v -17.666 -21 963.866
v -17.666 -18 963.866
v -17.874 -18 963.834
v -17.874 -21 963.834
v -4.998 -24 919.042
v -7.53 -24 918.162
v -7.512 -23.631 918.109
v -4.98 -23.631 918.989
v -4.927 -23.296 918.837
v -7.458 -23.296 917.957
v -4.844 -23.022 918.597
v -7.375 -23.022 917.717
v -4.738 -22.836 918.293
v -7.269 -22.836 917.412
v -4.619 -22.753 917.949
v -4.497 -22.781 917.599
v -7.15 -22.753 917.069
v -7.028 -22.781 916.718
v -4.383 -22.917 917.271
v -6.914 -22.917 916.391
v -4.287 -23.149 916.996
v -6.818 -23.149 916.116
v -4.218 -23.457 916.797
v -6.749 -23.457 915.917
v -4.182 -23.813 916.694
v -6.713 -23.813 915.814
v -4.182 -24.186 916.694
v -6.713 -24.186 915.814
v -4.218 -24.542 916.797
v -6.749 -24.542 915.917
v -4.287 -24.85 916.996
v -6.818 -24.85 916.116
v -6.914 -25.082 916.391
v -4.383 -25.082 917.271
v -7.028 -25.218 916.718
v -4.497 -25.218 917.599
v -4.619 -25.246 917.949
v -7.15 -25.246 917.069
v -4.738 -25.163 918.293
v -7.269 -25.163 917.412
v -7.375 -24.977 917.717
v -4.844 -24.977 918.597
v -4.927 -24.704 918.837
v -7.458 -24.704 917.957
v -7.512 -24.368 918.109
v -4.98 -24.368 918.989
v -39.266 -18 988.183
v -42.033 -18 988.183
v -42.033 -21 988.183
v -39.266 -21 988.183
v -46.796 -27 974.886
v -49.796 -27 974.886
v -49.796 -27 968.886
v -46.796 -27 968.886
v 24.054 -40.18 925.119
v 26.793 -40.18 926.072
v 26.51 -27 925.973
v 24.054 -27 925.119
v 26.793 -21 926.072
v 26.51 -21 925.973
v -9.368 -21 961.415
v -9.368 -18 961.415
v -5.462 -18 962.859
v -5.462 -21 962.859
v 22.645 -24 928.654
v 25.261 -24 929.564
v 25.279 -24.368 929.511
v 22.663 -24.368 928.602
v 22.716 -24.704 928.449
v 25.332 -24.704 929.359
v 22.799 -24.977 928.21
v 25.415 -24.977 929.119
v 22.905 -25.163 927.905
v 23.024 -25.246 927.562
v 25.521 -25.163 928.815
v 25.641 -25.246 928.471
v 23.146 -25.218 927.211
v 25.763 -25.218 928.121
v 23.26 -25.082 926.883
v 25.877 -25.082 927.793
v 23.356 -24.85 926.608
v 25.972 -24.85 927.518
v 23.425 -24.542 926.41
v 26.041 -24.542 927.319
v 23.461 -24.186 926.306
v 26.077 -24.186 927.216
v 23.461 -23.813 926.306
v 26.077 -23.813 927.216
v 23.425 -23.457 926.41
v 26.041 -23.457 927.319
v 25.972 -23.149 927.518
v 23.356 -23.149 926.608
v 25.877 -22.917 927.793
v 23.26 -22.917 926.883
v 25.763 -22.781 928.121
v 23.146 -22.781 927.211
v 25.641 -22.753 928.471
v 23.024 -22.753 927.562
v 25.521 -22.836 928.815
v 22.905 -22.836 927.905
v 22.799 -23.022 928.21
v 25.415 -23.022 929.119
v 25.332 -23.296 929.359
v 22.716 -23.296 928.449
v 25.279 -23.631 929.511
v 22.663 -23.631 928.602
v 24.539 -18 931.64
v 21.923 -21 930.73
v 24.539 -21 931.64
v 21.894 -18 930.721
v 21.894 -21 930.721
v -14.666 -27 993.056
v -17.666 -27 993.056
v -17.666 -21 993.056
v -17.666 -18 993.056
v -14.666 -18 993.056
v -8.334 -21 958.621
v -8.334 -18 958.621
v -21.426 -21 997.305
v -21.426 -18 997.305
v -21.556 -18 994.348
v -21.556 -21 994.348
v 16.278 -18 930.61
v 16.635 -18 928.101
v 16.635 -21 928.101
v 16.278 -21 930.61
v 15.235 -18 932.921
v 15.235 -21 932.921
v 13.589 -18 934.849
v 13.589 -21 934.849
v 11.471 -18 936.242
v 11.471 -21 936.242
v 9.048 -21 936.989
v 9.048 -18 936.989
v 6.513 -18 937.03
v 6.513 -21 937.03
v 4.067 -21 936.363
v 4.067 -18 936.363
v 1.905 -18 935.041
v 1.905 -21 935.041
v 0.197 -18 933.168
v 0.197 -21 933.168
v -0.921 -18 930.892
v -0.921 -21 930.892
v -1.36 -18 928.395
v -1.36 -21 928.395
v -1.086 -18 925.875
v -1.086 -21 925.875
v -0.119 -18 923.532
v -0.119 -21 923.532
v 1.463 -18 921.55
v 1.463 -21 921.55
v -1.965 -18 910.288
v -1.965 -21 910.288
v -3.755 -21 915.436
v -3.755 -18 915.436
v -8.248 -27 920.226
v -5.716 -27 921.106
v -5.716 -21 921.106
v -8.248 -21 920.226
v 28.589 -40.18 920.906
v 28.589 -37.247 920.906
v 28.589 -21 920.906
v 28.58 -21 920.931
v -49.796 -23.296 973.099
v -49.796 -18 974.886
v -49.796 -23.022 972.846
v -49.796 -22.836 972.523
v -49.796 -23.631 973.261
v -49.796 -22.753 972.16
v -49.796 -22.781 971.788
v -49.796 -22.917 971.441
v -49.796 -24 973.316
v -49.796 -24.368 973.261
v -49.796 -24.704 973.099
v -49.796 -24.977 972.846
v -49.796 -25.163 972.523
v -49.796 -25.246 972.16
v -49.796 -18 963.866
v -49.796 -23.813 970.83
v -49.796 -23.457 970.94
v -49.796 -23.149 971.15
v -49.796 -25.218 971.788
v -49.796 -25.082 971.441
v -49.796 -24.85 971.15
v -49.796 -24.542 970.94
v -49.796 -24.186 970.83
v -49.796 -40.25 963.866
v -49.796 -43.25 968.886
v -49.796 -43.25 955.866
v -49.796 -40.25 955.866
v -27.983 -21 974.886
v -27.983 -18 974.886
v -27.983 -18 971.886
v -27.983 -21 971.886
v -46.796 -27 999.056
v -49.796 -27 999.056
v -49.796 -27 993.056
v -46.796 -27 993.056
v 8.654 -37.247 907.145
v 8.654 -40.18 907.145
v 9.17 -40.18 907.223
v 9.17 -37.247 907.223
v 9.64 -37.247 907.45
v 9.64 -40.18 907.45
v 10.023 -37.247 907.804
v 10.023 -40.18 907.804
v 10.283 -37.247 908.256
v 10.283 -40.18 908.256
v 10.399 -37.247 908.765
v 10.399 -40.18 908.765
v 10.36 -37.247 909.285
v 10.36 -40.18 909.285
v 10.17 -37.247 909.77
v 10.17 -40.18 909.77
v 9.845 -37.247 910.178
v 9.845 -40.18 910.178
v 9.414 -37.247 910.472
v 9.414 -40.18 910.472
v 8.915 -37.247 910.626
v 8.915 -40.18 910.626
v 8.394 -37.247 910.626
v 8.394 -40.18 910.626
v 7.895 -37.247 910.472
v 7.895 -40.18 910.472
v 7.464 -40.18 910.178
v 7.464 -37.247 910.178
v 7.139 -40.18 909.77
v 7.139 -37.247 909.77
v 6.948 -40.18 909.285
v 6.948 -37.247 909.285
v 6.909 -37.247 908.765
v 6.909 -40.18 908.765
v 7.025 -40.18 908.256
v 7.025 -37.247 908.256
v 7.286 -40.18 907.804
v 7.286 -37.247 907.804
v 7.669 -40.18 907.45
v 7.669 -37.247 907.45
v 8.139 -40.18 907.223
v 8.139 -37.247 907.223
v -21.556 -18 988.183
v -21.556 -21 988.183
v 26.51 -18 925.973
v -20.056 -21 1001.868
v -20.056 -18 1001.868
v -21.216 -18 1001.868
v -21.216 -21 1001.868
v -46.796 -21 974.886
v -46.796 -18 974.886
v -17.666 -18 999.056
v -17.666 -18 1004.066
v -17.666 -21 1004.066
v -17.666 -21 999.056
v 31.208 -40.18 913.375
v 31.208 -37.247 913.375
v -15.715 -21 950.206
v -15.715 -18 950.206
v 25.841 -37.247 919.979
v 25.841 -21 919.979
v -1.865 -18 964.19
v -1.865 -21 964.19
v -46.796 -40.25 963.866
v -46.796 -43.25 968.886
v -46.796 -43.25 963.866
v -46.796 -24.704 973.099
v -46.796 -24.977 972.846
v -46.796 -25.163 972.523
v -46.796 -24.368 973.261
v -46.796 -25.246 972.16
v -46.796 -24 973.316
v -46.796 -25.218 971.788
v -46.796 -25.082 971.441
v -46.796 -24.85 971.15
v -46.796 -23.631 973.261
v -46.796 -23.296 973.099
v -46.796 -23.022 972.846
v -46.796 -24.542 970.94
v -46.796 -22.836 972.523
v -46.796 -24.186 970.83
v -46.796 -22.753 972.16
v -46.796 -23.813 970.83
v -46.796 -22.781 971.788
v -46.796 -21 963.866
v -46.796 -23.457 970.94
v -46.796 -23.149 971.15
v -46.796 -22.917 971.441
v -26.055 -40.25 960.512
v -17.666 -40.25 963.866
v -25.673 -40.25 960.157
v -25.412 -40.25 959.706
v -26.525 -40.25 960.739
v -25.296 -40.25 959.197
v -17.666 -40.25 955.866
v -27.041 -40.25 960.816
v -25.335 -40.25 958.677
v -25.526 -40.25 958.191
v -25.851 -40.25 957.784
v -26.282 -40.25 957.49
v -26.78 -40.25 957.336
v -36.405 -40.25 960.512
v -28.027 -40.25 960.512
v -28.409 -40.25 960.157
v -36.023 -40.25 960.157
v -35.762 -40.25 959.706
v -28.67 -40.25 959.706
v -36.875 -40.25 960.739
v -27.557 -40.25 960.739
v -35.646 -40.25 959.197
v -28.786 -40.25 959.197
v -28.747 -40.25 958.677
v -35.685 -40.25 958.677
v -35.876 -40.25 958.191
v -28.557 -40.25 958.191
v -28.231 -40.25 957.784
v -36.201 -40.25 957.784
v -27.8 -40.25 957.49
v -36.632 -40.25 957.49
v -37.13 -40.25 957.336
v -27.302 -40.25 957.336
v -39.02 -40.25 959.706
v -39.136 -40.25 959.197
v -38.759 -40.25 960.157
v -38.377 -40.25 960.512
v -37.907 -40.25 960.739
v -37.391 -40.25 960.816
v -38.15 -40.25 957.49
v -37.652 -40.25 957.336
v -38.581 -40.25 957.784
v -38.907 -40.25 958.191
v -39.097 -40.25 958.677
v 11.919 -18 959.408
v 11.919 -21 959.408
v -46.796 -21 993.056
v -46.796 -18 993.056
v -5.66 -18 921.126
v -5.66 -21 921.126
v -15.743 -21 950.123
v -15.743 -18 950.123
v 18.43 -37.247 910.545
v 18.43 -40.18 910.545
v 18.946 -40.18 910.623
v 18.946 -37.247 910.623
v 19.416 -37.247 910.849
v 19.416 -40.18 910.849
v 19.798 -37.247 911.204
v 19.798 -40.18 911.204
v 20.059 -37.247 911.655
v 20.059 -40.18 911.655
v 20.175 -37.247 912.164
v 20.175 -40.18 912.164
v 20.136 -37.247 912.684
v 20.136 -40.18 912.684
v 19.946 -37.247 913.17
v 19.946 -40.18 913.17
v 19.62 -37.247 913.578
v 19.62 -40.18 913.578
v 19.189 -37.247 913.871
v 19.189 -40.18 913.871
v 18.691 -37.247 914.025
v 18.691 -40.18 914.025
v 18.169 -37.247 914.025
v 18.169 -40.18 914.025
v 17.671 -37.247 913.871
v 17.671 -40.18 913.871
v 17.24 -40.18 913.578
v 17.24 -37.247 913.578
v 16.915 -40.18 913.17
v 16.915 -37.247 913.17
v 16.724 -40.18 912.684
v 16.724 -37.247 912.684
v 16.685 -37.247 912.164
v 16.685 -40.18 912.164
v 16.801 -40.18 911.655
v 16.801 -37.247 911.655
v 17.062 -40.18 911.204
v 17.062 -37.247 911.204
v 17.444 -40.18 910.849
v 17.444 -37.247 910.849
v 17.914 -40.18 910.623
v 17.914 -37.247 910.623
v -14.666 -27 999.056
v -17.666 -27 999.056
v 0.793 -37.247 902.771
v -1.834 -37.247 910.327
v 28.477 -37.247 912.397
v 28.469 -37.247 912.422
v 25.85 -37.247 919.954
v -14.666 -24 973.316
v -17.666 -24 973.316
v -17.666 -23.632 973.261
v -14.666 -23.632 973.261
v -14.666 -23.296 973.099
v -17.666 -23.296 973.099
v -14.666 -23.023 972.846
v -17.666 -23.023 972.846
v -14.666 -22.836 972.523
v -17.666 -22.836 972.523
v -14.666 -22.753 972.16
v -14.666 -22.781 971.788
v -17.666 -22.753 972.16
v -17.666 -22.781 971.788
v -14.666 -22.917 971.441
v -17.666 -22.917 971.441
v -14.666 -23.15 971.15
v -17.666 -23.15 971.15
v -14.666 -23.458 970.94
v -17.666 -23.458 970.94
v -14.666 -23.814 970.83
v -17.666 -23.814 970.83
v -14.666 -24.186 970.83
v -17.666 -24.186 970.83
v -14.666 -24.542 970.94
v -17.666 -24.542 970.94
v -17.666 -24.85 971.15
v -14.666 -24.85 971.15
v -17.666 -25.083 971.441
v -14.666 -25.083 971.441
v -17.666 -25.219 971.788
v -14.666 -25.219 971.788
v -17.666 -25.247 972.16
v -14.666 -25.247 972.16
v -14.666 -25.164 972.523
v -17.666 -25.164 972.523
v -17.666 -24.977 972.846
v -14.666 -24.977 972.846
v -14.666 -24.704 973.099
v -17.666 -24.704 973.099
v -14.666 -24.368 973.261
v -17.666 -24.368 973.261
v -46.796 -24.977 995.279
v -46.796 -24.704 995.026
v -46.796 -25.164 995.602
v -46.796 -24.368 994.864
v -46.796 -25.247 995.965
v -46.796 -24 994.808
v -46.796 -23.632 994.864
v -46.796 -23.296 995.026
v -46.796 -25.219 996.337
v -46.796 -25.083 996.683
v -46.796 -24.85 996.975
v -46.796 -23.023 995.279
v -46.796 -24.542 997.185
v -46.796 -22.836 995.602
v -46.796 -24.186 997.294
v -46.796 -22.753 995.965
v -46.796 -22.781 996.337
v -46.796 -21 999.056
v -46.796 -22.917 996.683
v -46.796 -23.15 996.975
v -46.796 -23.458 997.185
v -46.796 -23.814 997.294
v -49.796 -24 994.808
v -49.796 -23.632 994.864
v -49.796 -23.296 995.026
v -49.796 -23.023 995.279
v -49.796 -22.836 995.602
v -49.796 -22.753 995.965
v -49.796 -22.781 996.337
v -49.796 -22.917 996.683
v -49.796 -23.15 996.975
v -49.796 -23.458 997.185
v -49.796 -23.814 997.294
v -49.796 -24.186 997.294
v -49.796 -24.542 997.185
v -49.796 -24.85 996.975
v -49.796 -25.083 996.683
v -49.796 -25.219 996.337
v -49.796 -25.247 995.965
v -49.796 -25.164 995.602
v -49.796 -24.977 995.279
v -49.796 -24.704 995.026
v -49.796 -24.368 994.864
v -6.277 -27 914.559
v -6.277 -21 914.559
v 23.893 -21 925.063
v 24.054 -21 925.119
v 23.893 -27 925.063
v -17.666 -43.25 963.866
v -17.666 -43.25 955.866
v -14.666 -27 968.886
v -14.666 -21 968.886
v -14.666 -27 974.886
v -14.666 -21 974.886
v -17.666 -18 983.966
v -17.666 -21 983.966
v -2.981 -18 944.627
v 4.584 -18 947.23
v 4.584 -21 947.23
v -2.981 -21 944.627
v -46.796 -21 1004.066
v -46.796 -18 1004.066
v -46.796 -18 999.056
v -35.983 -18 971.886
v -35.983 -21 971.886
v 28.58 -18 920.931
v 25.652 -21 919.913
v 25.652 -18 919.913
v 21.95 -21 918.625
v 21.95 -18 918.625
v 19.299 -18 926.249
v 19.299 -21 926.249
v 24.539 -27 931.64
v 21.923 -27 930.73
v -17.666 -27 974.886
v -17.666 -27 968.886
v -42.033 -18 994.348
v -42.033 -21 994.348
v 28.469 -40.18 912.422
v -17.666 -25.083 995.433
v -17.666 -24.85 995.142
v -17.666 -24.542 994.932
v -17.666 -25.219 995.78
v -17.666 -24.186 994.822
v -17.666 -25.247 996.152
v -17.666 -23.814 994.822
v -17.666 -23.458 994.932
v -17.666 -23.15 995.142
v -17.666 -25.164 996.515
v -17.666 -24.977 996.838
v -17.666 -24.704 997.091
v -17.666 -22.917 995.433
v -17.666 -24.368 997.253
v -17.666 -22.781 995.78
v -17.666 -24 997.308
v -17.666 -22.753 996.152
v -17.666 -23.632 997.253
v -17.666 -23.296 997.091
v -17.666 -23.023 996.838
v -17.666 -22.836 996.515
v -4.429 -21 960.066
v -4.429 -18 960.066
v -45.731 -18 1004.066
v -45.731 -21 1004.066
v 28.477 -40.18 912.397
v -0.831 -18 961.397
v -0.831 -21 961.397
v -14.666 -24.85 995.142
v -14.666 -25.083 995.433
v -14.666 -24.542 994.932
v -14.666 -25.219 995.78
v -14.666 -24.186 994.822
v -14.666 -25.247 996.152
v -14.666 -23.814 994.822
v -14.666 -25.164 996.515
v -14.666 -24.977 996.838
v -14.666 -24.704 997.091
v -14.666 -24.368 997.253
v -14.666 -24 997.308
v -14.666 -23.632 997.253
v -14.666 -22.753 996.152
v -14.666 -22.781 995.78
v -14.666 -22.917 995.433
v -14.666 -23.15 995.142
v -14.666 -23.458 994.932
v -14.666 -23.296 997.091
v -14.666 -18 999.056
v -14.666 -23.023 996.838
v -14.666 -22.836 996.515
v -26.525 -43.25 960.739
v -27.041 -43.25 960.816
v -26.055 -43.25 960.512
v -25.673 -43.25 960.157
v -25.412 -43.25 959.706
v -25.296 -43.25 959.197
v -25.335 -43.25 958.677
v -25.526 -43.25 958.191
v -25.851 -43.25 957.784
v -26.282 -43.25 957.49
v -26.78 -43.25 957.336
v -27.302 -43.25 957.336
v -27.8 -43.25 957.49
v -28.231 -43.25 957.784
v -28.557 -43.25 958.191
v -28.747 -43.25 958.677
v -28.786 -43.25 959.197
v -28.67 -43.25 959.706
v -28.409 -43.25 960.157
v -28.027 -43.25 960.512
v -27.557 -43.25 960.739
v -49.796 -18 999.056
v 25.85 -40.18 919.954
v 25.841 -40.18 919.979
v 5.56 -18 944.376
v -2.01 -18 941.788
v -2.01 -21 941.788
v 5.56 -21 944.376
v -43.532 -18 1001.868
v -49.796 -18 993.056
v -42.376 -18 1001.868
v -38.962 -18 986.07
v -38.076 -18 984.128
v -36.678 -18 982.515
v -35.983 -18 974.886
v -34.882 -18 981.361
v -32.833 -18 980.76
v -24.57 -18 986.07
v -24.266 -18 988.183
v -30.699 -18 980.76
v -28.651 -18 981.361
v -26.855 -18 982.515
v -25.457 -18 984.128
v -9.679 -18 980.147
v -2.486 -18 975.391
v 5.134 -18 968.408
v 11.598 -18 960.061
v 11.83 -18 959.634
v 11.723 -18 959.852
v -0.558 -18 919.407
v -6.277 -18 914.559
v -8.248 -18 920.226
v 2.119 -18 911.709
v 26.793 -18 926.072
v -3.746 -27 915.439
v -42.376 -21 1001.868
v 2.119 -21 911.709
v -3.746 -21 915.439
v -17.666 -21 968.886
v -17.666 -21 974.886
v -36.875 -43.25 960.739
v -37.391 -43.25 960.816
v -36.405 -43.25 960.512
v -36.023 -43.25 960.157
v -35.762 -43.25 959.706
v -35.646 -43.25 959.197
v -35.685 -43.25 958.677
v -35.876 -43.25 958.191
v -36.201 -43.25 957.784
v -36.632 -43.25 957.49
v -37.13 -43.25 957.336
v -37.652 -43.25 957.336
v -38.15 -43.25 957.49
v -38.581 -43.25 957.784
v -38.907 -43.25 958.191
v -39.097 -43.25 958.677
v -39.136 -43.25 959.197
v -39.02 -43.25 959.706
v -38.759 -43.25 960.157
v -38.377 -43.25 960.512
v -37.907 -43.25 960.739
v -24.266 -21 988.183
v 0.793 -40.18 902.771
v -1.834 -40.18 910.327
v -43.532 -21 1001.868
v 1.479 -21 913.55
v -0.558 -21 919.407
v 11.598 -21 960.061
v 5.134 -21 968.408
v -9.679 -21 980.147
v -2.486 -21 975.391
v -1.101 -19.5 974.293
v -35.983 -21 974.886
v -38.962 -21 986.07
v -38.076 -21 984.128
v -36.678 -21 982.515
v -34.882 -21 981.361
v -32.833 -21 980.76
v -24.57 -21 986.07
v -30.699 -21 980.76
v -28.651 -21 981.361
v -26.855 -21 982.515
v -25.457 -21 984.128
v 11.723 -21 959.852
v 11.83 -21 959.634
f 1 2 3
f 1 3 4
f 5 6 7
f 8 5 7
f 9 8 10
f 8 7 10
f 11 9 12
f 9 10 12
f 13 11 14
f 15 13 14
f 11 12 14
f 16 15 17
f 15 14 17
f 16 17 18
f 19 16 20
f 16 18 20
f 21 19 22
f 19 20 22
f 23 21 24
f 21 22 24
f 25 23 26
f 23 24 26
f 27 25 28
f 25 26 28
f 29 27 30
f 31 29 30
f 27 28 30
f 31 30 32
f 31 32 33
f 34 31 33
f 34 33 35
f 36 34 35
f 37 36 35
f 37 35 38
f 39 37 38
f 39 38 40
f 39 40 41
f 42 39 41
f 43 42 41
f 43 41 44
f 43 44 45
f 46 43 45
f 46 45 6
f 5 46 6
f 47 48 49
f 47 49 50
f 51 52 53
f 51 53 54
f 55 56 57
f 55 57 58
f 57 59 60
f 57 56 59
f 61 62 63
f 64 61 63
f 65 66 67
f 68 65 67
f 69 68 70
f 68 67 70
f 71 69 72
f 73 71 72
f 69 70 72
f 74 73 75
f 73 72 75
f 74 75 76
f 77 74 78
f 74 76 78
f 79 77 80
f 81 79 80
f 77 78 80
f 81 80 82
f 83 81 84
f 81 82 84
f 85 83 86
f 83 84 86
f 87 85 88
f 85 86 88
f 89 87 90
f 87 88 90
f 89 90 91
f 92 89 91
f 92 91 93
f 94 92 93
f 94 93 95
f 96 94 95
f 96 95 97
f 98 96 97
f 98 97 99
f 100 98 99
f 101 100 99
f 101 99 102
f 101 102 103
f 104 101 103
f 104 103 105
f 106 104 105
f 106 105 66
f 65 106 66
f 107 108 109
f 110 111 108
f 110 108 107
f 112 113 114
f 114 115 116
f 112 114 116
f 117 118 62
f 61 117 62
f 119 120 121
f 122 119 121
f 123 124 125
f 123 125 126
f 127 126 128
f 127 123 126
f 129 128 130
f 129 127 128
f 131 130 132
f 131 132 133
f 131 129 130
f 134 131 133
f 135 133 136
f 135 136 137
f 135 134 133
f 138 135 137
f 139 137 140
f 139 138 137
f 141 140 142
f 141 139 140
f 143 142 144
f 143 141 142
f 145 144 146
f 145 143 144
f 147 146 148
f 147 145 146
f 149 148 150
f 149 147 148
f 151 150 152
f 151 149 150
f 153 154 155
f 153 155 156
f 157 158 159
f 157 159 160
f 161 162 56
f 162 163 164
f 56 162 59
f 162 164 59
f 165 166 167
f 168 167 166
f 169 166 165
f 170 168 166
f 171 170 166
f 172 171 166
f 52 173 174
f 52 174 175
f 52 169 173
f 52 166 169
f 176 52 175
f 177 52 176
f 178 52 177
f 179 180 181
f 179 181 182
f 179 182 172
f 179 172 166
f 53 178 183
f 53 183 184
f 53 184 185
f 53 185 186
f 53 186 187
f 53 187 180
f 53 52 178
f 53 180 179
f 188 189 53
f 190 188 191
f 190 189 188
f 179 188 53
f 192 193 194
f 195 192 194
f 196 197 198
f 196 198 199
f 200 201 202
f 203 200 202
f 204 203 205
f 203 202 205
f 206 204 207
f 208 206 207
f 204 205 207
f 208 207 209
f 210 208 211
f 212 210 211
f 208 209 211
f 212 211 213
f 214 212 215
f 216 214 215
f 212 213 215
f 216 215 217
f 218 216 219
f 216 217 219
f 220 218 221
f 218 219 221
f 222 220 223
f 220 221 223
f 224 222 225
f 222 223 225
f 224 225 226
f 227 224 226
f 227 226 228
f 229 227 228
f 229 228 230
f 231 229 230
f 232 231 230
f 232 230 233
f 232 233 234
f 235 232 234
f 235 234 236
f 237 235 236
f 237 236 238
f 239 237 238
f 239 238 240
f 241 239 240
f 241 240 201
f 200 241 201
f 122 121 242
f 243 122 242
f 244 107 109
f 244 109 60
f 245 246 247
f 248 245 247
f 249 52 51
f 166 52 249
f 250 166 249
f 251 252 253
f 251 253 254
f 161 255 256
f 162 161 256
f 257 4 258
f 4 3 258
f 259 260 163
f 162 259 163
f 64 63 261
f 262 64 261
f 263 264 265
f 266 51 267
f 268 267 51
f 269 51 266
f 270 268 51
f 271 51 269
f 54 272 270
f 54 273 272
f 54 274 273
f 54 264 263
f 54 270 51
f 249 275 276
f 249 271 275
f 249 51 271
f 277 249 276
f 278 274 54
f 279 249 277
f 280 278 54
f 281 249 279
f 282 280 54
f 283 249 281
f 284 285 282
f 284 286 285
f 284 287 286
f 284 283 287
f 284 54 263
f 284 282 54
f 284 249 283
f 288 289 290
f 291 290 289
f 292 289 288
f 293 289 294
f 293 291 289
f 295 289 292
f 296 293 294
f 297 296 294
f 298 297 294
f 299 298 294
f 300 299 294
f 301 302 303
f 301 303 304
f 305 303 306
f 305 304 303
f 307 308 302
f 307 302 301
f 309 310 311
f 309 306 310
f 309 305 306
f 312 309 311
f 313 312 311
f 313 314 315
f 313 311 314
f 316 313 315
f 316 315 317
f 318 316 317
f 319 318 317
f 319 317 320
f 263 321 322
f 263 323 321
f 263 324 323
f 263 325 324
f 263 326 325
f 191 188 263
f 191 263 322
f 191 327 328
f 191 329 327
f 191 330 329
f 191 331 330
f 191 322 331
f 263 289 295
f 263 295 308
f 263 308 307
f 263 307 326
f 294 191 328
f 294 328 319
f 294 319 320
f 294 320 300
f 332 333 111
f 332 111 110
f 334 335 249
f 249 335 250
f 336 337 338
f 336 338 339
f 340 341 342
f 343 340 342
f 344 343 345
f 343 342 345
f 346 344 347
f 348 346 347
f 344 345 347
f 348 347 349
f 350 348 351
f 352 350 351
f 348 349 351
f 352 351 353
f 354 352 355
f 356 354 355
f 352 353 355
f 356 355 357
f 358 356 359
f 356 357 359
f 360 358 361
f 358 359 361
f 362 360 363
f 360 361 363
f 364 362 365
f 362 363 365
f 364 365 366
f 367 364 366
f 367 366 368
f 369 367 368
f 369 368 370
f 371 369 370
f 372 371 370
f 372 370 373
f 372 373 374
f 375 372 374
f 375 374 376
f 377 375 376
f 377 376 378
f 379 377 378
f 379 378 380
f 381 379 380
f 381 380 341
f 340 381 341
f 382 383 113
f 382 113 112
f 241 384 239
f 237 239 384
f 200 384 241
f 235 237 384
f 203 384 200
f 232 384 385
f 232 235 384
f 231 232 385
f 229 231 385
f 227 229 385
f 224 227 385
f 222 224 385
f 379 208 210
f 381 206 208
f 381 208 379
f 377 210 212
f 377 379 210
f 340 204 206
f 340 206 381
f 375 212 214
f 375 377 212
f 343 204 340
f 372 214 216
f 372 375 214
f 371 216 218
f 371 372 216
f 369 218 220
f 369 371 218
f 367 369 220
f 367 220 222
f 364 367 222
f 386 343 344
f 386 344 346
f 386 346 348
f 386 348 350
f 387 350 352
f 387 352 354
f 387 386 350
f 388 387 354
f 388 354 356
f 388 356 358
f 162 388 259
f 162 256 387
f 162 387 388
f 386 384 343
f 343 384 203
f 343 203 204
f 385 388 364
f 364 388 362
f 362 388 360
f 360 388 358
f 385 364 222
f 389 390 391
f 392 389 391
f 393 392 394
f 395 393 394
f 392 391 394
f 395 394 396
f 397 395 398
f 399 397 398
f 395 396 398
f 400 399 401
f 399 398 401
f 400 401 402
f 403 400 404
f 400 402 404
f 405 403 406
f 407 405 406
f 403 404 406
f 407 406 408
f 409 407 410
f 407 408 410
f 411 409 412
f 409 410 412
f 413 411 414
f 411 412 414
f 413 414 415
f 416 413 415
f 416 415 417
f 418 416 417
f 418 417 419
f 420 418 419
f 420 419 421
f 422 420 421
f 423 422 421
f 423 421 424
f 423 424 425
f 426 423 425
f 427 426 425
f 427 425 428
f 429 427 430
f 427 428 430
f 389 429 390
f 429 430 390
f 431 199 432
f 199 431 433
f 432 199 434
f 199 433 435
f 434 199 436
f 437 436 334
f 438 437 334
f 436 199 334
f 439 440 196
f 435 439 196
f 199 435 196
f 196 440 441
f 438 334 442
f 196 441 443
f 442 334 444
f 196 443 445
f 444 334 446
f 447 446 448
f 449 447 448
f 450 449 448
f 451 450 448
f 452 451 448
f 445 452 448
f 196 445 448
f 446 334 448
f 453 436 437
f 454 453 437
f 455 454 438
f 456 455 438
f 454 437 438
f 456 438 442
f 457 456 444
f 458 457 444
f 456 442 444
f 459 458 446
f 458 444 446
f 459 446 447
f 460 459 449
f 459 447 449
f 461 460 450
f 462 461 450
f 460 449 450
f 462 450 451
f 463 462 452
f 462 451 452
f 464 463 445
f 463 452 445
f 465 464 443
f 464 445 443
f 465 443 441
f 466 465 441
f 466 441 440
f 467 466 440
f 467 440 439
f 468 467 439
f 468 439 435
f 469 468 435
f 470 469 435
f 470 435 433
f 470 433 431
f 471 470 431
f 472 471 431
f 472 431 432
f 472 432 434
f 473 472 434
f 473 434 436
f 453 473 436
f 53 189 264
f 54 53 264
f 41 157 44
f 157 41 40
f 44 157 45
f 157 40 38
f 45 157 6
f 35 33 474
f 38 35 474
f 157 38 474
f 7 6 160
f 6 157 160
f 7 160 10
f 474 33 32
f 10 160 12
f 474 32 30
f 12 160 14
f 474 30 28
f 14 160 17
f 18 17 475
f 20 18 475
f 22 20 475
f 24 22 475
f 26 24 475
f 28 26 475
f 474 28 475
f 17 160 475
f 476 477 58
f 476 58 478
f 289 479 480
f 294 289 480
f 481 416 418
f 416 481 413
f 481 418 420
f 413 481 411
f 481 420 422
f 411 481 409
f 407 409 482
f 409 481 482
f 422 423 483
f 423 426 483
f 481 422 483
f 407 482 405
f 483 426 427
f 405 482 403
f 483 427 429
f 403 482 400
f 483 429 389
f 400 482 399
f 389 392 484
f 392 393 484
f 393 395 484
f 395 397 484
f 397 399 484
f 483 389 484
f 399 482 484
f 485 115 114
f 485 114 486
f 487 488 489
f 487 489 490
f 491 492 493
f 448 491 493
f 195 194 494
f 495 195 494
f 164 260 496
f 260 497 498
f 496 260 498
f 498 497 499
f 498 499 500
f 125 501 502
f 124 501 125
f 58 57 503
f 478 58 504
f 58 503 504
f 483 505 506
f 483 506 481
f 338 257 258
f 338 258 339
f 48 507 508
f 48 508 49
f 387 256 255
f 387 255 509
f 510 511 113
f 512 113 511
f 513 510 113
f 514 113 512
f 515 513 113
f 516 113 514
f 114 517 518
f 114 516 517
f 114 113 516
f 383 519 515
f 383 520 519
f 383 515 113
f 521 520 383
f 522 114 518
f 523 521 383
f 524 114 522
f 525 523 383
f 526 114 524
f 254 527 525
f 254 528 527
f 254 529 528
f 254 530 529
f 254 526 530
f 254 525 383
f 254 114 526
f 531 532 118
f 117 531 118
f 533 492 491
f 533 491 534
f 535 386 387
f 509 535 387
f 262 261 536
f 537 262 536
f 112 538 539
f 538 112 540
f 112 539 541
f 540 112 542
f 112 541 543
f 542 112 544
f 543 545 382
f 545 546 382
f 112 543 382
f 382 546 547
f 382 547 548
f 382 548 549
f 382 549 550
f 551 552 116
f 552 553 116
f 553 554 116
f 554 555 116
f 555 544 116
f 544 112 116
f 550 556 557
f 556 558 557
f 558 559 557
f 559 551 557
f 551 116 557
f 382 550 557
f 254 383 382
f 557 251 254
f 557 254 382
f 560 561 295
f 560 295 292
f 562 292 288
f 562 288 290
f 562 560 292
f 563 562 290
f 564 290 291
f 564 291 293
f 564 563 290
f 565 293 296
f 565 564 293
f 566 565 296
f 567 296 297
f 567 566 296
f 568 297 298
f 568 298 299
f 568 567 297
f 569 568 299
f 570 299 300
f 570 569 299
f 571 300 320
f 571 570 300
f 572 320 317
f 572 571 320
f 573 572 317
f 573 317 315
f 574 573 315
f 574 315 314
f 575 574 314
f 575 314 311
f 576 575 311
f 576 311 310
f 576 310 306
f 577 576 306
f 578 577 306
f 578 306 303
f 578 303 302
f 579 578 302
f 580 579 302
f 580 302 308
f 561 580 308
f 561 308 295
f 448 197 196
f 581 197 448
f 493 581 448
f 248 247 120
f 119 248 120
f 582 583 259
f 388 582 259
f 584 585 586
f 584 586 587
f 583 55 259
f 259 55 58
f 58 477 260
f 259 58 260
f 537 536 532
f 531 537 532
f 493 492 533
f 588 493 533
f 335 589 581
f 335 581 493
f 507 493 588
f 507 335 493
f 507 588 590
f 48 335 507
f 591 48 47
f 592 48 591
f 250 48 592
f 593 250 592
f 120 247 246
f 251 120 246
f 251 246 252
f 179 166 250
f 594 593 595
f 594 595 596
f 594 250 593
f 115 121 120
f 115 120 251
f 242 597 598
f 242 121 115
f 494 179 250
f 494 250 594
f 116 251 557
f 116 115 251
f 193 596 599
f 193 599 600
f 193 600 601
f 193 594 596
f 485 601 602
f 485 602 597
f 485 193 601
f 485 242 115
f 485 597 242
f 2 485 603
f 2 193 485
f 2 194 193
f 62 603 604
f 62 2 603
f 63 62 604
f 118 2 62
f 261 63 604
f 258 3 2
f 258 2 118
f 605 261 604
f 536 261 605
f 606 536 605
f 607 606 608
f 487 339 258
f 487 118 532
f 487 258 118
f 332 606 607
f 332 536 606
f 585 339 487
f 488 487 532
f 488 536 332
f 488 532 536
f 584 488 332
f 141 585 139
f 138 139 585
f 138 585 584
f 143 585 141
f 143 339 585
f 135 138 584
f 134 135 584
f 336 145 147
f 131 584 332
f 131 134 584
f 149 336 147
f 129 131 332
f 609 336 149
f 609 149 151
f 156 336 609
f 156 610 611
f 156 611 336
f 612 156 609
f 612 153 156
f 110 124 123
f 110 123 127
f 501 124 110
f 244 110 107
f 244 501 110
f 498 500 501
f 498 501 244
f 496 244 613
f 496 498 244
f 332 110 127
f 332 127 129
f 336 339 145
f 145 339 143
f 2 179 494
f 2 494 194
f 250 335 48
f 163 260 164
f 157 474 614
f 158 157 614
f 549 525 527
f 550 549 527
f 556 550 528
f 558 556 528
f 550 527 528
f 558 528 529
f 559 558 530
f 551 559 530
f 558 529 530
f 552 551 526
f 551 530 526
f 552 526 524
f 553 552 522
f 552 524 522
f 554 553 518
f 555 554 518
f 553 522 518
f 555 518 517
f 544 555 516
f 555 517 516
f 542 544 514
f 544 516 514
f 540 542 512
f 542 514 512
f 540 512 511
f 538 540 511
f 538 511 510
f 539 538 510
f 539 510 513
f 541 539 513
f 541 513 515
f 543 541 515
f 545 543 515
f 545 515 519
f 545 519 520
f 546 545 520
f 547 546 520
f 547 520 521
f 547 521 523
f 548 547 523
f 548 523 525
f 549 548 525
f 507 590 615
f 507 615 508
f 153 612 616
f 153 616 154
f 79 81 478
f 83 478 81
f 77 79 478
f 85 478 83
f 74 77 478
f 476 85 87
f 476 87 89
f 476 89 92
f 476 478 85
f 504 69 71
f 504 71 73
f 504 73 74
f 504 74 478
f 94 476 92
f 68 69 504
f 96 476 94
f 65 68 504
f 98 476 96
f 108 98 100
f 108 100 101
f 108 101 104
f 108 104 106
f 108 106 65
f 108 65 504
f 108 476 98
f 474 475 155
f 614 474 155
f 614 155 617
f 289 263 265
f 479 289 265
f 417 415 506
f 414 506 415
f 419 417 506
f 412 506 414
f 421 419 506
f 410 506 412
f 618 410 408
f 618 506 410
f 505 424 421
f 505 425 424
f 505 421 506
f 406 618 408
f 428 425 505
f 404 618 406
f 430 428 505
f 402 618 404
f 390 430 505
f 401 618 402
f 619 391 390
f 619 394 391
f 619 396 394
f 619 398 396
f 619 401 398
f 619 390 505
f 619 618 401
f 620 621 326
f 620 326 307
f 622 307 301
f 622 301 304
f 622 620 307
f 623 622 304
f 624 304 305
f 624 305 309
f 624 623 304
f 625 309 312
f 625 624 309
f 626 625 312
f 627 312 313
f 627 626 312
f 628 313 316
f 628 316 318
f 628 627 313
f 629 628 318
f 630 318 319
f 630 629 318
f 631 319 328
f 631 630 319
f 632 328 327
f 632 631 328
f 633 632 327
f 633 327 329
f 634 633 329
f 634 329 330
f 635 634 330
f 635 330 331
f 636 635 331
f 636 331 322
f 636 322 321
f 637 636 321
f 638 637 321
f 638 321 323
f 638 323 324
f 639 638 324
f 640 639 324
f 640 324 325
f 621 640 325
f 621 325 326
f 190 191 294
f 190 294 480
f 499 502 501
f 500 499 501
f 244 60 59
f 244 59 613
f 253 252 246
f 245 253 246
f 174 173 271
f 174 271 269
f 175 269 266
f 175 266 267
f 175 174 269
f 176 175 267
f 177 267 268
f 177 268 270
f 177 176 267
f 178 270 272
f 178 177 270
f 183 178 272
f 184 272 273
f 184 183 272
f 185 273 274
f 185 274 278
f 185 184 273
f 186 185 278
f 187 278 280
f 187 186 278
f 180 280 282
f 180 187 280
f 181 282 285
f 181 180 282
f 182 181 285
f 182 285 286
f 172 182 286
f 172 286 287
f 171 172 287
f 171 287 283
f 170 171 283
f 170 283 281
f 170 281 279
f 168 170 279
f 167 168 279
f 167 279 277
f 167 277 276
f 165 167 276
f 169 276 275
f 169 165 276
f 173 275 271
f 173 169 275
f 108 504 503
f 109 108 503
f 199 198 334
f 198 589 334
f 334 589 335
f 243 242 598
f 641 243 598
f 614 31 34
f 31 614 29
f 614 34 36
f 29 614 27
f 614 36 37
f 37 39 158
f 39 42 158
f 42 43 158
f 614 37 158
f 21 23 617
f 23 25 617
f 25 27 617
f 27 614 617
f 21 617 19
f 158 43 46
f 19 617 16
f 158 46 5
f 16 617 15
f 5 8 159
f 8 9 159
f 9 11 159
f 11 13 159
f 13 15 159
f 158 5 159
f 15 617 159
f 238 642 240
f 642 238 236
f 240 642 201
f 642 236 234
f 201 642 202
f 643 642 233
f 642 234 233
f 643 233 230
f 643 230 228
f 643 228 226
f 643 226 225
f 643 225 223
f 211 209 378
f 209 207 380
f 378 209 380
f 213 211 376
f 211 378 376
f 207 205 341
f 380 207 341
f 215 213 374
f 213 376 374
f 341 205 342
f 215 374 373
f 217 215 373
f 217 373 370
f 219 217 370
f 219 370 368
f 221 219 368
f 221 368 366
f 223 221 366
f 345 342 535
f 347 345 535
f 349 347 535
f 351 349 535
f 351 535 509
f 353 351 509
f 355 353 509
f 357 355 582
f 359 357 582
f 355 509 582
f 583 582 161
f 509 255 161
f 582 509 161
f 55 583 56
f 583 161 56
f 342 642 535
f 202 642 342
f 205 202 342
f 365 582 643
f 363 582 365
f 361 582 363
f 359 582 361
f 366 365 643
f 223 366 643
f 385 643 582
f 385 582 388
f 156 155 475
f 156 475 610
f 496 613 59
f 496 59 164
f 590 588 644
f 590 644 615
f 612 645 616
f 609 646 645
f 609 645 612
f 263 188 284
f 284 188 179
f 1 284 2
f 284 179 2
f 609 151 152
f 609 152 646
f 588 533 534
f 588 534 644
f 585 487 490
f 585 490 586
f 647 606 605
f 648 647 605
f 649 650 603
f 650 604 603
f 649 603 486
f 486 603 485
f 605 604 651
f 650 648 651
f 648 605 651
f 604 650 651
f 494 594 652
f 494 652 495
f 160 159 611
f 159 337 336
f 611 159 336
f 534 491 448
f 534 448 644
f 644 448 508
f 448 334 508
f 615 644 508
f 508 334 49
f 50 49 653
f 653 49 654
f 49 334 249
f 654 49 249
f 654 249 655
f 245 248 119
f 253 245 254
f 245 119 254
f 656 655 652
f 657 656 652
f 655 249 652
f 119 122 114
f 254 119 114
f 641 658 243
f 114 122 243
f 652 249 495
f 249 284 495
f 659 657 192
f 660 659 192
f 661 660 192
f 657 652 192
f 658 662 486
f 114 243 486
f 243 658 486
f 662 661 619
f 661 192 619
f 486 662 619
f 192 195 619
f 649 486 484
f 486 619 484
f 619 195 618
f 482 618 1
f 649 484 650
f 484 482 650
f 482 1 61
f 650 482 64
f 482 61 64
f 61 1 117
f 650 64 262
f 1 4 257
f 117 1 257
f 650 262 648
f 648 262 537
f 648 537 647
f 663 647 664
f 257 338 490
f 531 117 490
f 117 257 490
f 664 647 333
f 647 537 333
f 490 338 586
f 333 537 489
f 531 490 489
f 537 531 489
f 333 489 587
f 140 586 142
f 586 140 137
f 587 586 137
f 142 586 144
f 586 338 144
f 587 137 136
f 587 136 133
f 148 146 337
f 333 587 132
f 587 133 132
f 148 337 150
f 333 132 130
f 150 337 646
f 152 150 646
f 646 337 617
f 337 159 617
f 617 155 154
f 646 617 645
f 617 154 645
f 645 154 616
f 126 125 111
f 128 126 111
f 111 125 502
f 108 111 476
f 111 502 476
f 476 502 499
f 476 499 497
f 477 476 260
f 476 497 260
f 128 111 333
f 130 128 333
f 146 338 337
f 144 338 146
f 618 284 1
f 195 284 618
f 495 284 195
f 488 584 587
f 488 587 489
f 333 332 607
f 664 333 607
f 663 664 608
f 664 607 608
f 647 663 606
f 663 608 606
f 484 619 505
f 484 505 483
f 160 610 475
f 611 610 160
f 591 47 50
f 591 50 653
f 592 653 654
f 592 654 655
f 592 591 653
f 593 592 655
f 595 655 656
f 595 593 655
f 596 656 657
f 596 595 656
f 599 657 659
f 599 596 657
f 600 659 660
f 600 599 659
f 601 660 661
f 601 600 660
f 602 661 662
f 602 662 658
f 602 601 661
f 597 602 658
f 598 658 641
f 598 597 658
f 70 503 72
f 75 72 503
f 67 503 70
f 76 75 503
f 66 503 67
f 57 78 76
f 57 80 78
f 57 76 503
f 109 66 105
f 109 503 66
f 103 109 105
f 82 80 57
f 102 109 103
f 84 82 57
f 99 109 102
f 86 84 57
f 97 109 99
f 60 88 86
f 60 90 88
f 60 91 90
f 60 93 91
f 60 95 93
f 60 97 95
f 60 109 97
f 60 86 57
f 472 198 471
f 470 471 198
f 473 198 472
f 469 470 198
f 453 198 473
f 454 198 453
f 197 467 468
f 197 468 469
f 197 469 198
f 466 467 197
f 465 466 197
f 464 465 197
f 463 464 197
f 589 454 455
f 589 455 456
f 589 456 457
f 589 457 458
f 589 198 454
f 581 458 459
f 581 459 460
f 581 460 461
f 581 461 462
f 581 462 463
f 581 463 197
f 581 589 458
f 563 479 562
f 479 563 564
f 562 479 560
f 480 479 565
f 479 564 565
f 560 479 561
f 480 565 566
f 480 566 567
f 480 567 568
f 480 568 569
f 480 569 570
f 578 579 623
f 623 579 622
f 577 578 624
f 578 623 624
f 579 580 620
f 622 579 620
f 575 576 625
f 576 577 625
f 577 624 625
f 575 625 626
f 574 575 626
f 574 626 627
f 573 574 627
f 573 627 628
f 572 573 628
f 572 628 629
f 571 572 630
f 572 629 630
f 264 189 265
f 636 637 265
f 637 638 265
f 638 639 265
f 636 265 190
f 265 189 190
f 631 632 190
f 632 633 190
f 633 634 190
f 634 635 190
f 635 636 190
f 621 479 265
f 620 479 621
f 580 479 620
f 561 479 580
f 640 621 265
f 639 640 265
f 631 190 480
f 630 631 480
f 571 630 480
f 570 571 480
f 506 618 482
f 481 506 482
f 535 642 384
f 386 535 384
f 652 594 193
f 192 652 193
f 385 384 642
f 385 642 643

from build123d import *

# Parameters (mm, degrees)
SKETCH1_W                 = 29.13
SKETCH1_H                 = 40.2
BOSS_EXTRUDE1_DEPTH       = 3
SKETCH3_W                 = 6
SKETCH3_H                 = 3
BOSS_EXTRUDE2_DEPTH       = 3
SKETCH4_W                 = 3
SKETCH4_H                 = 6
BOSS_EXTRUDE3_DEPTH       = 6
SKETCH6_W                 = 6
SKETCH6_H                 = 3
BOSS_EXTRUDE4_DEPTH       = 2
SKETCH7_W                 = 3.000000005
SKETCH7_H                 = 6
BOSS_EXTRUDE6_DEPTH       = 6
SKETCH9_R                 = 1.25
CUT_EXTRUDE1_DEPTH        = 3
SKETCH8_R                 = 1.250000001
CUT_EXTRUDE2_DEPTH        = 3
SKETCH11_W                = 6
SKETCH11_H                = 3
BOSS_EXTRUDE7_DEPTH       = 3
SKETCH19_W                = 3
SKETCH19_H                = 6
BOSS_EXTRUDE11_DEPTH      = 6
SKETCH21_W                = 6
SKETCH21_H                = 3
BOSS_EXTRUDE12_DEPTH      = 3
SKETCH22_W                = 3
SKETCH22_H                = 6
BOSS_EXTRUDE13_DEPTH      = 6
SKETCH24_R                = 1.25
CUT_EXTRUDE5_DEPTH        = 4
SKETCH23_R                = 1.25
CUT_EXTRUDE6_DEPTH        = 4
CUT_EXTRUDE11_DEPTH       = 4
SKETCH30_W                = 25.92
SKETCH30_H                = 3
CUT_EXTRUDE12_DEPTH       = 15
SKETCH33_W                = 29.17650364
SKETCH33_H                = 3
BOSS_EXTRUDE14_DEPTH      = 40.3
SKETCH34_W                = 21.00258235
SKETCH34_H                = 3
CUT_EXTRUDE15_DEPTH       = 25
SKETCH37_W                = 4.5
SKETCH37_H                = 3
SKETCH37_W_2              = 1.5
BOSS_EXTRUDE15_DEPTH      = 3
BOSS_EXTRUDE16_DEPTH      = 6
SKETCH41_W                = 6
SKETCH41_H                = 3
BOSS_EXTRUDE17_DEPTH      = 2.8
BOSS_EXTRUDE18_DEPTH      = 6
SKETCH46_W                = 5.02
SKETCH46_H                = 3
BOSS_EXTRUDE19_DEPTH      = 3
SKETCH48_W                = 3
SKETCH48_H                = 5.02
BOSS_EXTRUDE20_DEPTH      = 22.25
BOSS_EXTRUDE22_DEPTH      = 29.13
BOSS_EXTRUDE22_DEPTH_BACK = 3
SKETCH50_W                = 8
SKETCH50_H                = 3
SKETCH51_R                = 1.75
CUT_EXTRUDE21_DEPTH       = 5
SKETCH56_W                = 3.994197227
SKETCH56_H                = 3.994197227
CUT_EXTRUDE26_DEPTH       = 0.1
FILLET4_START             = -19
FILLET4_DEPTH             = 5
BOSS_EXTRUDE28_DEPTH      = 0.21
BOSS_EXTRUDE29_DEPTH      = 3
BOSS_EXTRUDE30_DEPTH      = 1.95
BOSS_EXTRUDE30_DEPTH_BACK = 4
SKETCH68_W                = 4.32399603
SKETCH68_H                = 3
SKETCH69_W                = 3.919724064
SKETCH69_H                = 3
BOSS_EXTRUDE31_DEPTH      = 1.83
SKETCH70_W                = 5.44243662
SKETCH70_H                = 3
BOSS_EXTRUDE32_DEPTH      = 3.1
BOSS_EXTRUDE33_DEPTH      = 19.18
SKETCH72_W                = 2.9
SKETCH72_H                = 2.93342148
BOSS_EXTRUDE34_DEPTH      = 8
SKETCH73_W                = 8
SKETCH73_H                = 2.93342148
BOSS_EXTRUDE35_DEPTH      = 29.31
SKETCH74_R                = 1.749999995
CUT_EXTRUDE27_DEPTH       = 5
SKETCH75_R                = 1.25
CUT_EXTRUDE28_DEPTH       = 5
SKETCH76_R                = 1.25
CUT_EXTRUDE29_DEPTH       = 5
BOSS_EXTRUDE37_DEPTH      = 3
BOSS_EXTRUDE40_DEPTH      = 3
SKETCH79_W                = 4
SKETCH79_H                = 3
CUT_EXTRUDE30_DEPTH       = 10
CUT_EXTRUDE31_DEPTH       = 10
CUT_EXTRUDE32_DEPTH       = 10


with BuildPart() as part:
    # Sketch1 → Boss-Extrude1 (new body)
    with BuildSketch(Plane(origin=(0, 0, 0), x_dir=(1, 0, 0), z_dir=(0, 1, 0))):
        with Locations((-32.231128585, -983.966354464)):
            Rectangle(SKETCH1_W, SKETCH1_H)
        with BuildLine():
            Line((-15.507778999, -950.239071497), (-17.666128585, -963.866354464))
            Line((-17.666128585, -963.866354464), (-17.666128585, -983.966354464))
            add(Edge.make_bspline(
                [(11.825950039, -959.709415703), (1.028086592, -976.494542347), (-17.666128585, -983.966354464)],
                knots=[0, 0, 0, 1, 1, 1], degree=2))
            Line((11.825950039, -959.709415703), (-15.497121464, -950.208422428))
            Line((-15.497121464, -950.208422428), (-15.507778999, -950.239071497))
        make_face()
    extrude(amount=-BOSS_EXTRUDE1_DEPTH)

    # Sketch3 → Boss-Extrude2 (add)
    with BuildSketch(Plane.ZY.offset(46.796128585)):
        with Locations((971.886354464, -1.5)):
            Rectangle(SKETCH3_W, SKETCH3_H)
    extrude(amount=BOSS_EXTRUDE2_DEPTH)

    # Sketch4 → Boss-Extrude3 (add)
    with BuildSketch(Plane.XZ.offset(3)):
        with Locations((-48.296128585, 971.886354464)):
            Rectangle(SKETCH4_W, SKETCH4_H)
    extrude(amount=BOSS_EXTRUDE3_DEPTH)

    # Sketch6 → Boss-Extrude4 (add)
    with BuildSketch(Plane(origin=(-17.666128585, 0, 0), x_dir=(0, 0, -1), z_dir=(1, 0, 0))):
        with Locations((-971.886354464, -1.5)):
            Rectangle(SKETCH6_W, SKETCH6_H)
    extrude(amount=BOSS_EXTRUDE4_DEPTH)

    # Sketch7 → Boss-Extrude6 (add)
    with BuildSketch(Plane.XZ.offset(3)):
        with Locations((-16.166128583, 971.886354464)):
            Rectangle(SKETCH7_W, SKETCH7_H)
    extrude(amount=BOSS_EXTRUDE6_DEPTH)

    # Sketch9 → Cut-Extrude1 (cut)
    with BuildSketch(Plane.ZY.offset(17.666128585)):
        with Locations((972.066354464, -6)):
            Circle(SKETCH9_R)
    extrude(amount=-CUT_EXTRUDE1_DEPTH, mode=Mode.SUBTRACT)

    # Sketch8 → Cut-Extrude2 (cut)
    with BuildSketch(Plane(origin=(-49.796128585, 0, 0), x_dir=(0, 0, -1), z_dir=(1, 0, 0))):
        with Locations(Location((-972.066168305, -5.999675203, 0), (0, 0, 180))):
            Circle(SKETCH8_R)
    extrude(amount=CUT_EXTRUDE2_DEPTH, mode=Mode.SUBTRACT)

    # Sketch11 → Boss-Extrude7 (add)
    with BuildSketch(Plane.ZY.offset(46.796128585)):
        with Locations((996.056354464, -1.5)):
            Rectangle(SKETCH11_W, SKETCH11_H)
    extrude(amount=BOSS_EXTRUDE7_DEPTH)

    # Sketch19 → Boss-Extrude11 (add)
    with BuildSketch(Plane.XZ.offset(3)):
        with Locations((-48.296128585, 996.056354464)):
            Rectangle(SKETCH19_W, SKETCH19_H)
    extrude(amount=BOSS_EXTRUDE11_DEPTH)

    # Sketch21 → Boss-Extrude12 (add)
    with BuildSketch(Plane(origin=(-17.666128585, 0, 0), x_dir=(0, 0, -1), z_dir=(1, 0, 0))):
        with Locations((-996.056354464, -1.5)):
            Rectangle(SKETCH21_W, SKETCH21_H)
    extrude(amount=BOSS_EXTRUDE12_DEPTH)

    # Sketch22 → Boss-Extrude13 (add)
    with BuildSketch(Plane.XZ.offset(3)):
        with Locations((-16.166128585, 996.056354464)):
            Rectangle(SKETCH22_W, SKETCH22_H)
    extrude(amount=BOSS_EXTRUDE13_DEPTH)

    # Sketch24 → Cut-Extrude5 (cut)
    with BuildSketch(Plane(origin=(-46.796128585, 0, 0), x_dir=(0, 0, -1), z_dir=(1, 0, 0))):
        with Locations((-996.058375158, -6)):
            Circle(SKETCH24_R)
    extrude(amount=-CUT_EXTRUDE5_DEPTH, mode=Mode.SUBTRACT)

    # Sketch23 → Cut-Extrude6 (cut)
    with BuildSketch(Plane.ZY.offset(17.666128585)):
        with Locations((996.058154464, -6)):
            Circle(SKETCH23_R)
    extrude(amount=-CUT_EXTRUDE6_DEPTH, mode=Mode.SUBTRACT)

    # Sketch29 → Cut-Extrude11 (cut)
    with BuildSketch(Plane(origin=(0, 0, 0), x_dir=(1, 0, 0), z_dir=(0, 1, 0))):
        Polygon((-24.326128585, -988.183184315), (-24.326128585, -1004.066354464), (-17.666128585, -1004.066354464), (-20.056128585, -1001.868057312), (-21.216128585, -1001.868057312), (-21.426128585, -997.305136389), (-21.556128585, -994.347976596), (-21.556128585, -988.183184315), align=None)
        Polygon((-42.032837695, -988.183184315), (-39.266128585, -988.183184315), (-39.266128585, -1004.066354464), (-45.730771266, -1004.066354464), (-43.532474114, -1001.868057312), (-42.376382193, -1001.868057312), (-42.032837695, -994.347976596), align=None)
    extrude(amount=-CUT_EXTRUDE11_DEPTH, mode=Mode.SUBTRACT)

    # Sketch30 → Cut-Extrude12 (cut)
    with BuildSketch(Plane.ZY.offset(39.266128585)):
        with Locations((991.106354464, -1.5)):
            Rectangle(SKETCH30_W, SKETCH30_H)
    extrude(amount=-CUT_EXTRUDE12_DEPTH, mode=Mode.SUBTRACT)

    # Sketch33 → Boss-Extrude14 (add)
    with BuildSketch(Plane(origin=(-296.443416752, 0, 852.515567448), x_dir=(-0.9445255798324886, 0, -0.32843786176703366), z_dir=(0.3284378617670337, 0, -0.9445255798324887))):
        with Locations((-311.77524668, -1.5)):
            Rectangle(SKETCH33_W, SKETCH33_H)
    extrude(amount=BOSS_EXTRUDE14_DEPTH)

    # Sketch34 → Cut-Extrude15 (cut)
    with BuildSketch(Plane(origin=(-283.207370923, 0, 814.451186581), x_dir=(-0.9445255798324887, 0, -0.32843786176703327), z_dir=(0.32843786176703327, 0, -0.9445255798324887))):
        with Locations((-311.942483261, -1.5)):
            Rectangle(SKETCH34_W, SKETCH34_H)
    extrude(amount=-CUT_EXTRUDE15_DEPTH, mode=Mode.SUBTRACT)

    # Sketch37 → Boss-Extrude15 (add)
    with BuildSketch(Plane(origin=(280.946295288, 0, 97.69285498), x_dir=(-0.32843786176743117, 0, 0.9445255798323505), z_dir=(-0.9445255798323505, 0, -0.32843786176743117))):
        with Locations((868.136002588, -1.5)):
            Rectangle(SKETCH37_W, SKETCH37_H)
        with Locations((871.136002588, -1.5)):
            Rectangle(SKETCH37_W_2, SKETCH37_H)
    extrude(amount=BOSS_EXTRUDE15_DEPTH)

    # Sketch39 → Boss-Extrude16 (add)
    with BuildSketch(Plane.XZ.offset(3)):
        Polygon((-6.277028676, 914.559020058), (-3.745700122, 915.439233528), (-5.716327292, 921.106387007), (-8.247655846, 920.226173537), align=None)
    extrude(amount=BOSS_EXTRUDE16_DEPTH)

    # Sketch41 → Boss-Extrude17 (add)
    with BuildSketch(Plane(origin=(308.258672657, 0, 107.190129606), x_dir=(0.3284378617670337, 0, -0.9445255798324887), z_dir=(0.9445255798324887, 0, 0.3284378617670337))):
        with Locations((-868.898439213, -1.5)):
            Rectangle(SKETCH41_W, SKETCH41_H)
    extrude(amount=BOSS_EXTRUDE17_DEPTH)

    # Sketch42 → Boss-Extrude18 (add)
    with BuildSketch(Plane.XZ.offset(3)):
        Polygon((23.893176542, 925.063208116), (21.922549371, 930.730361595), (24.538885227, 931.640134472), (26.509512398, 925.972980993), align=None)
    extrude(amount=BOSS_EXTRUDE18_DEPTH)


with BuildPart() as body_2:
    # Mirror1: mirrored copy
    add(part.part.mirror(Plane(origin=(0, -9, 0), x_dir=(0, 0, 1), z_dir=(0, -1, 0))))

    # Sketch46 → Boss-Extrude19 (add)
    with BuildSketch(Plane.ZY.offset(46.796128585)):
        with Locations((966.376354464, -16.5)):
            Rectangle(SKETCH46_W, SKETCH46_H)
    extrude(amount=BOSS_EXTRUDE19_DEPTH)

    # Sketch48 → Boss-Extrude20 (add)
    with BuildSketch(Plane(origin=(0, -15, 0), x_dir=(1, 0, 0), z_dir=(0, 1, 0))):
        with Locations((-48.296128585, -966.376354464)):
            Rectangle(SKETCH48_W, SKETCH48_H)
    extrude(amount=BOSS_EXTRUDE20_DEPTH)

    # Sketch50 → Boss-Extrude22 (add, two sides: drawn at the far end of the back side and taken through both)
    with BuildSketch(Plane(origin=(-46.796128585, 0, 0), x_dir=(0, 0, -1), z_dir=(1, 0, 0)).offset(-BOSS_EXTRUDE22_DEPTH_BACK)):
        with Locations((-959.866354464, 5.75)):
            Rectangle(SKETCH50_W, SKETCH50_H)
    extrude(amount=BOSS_EXTRUDE22_DEPTH + BOSS_EXTRUDE22_DEPTH_BACK)

    # Sketch51 → Cut-Extrude21 (cut)
    with BuildSketch(Plane(origin=(0, 7.25, 0), x_dir=(1, 0, 0), z_dir=(0, 1, 0))):
        with Locations(Location((-37.391128585, -959.066354477, 0), (0, 0, 270))):
            Circle(SKETCH51_R)
        with Locations(Location((-27.041128585, -959.066354477, 0), (0, 0, 270))):
            Circle(SKETCH51_R)
    extrude(amount=-CUT_EXTRUDE21_DEPTH, mode=Mode.SUBTRACT)

    # Sketch56 → Cut-Extrude26 (cut)
    with BuildSketch(Plane(origin=(-283.207370923, 0, 814.451186581), x_dir=(-0.9445255798324892, 0, -0.32843786176703227), z_dir=(0.32843786176703227, 0, -0.9445255798324892))):
        with Locations((-299.444093473, -16.997098614)):
            Rectangle(SKETCH56_W, SKETCH56_H)
    extrude(amount=-CUT_EXTRUDE26_DEPTH, mode=Mode.SUBTRACT)

    # Fillet4: read off the stored shape, not the designer's step
    # Fillet4 outline → Fillet4 (cut)
    with BuildSketch(Plane(origin=(0, 0, 0), x_dir=(1, 0, 0), z_dir=(0, 1, 0)).offset(FILLET4_START)):
        with BuildLine():
            Line((11.815255904, -959.705697054), (11.918892326, -959.407658179))
            ThreePointArc((11.918892326, -959.407658179), (11.77847749, -959.744040081), (11.598302874, -960.060909482))
            add(Edge.make_bspline(
                [(11.825950039, -959.709415703), (11.712561825, -959.885676085), (11.598302874, -960.060909482)],
                knots=[0, 0, 0, 0.010500986, 0.010500986, 0.010500986], degree=2))
            Line((11.825950039, -959.709415703), (11.815255904, -959.705697054))
        make_face()
    extrude(amount=FILLET4_DEPTH, mode=Mode.SUBTRACT)


with BuildPart() as body_2_2:
    # Mirror2: mirrored copy
    add(body_2.part.mirror(Plane(origin=(-13.409558554, -18, 961.997167091), x_dir=(0, 0, 1), z_dir=(0, -1, 0))))

    # Sketch63 → Boss-Extrude28 (add)
    with BuildSketch(Plane(origin=(131.691734271, 0, 20.857921628), x_dir=(-0.15643446504022615, 0, 0.9876883405951385), z_dir=(-0.9876883405951385, 0, -0.15643446504022615))):
        with BuildLine():
            add(Edge.make_bspline(
                [(954.763151571, -21), (947.864577189, -21), (940.966002807, -21)],
                knots=[0, 0, 0, 1, 1, 1], degree=2))
            Line((940.966002807, -21), (940.966002807, -18))
            add(Edge.make_bspline(
                [(954.763151571, -18), (947.864577189, -18), (940.966002807, -18)],
                knots=[0, 0, 0, 1, 1, 1], degree=2))
            Line((954.763151571, -18), (954.763151571, -21))
        make_face()
    extrude(amount=BOSS_EXTRUDE28_DEPTH)

    # Sketch67 → Boss-Extrude29 (add)
    with BuildSketch(Plane(origin=(0, -18, 0), x_dir=(1, 0, 0), z_dir=(0, 1, 0))):
        Polygon((-15.715193551, -950.206220259), (-15.742698114, -950.123028585), (-15.497121464, -950.208422428), (-15.507778999, -950.239071497), align=None)
    extrude(amount=-BOSS_EXTRUDE29_DEPTH)

    # Sketch68 → Boss-Extrude30 (add, two sides: drawn at the far end of the back side and taken through both)
    with BuildSketch(Plane(origin=(-283.240214709, 0, 814.545639139), x_dir=(-0.9445255798324883, -3.1744861168227707e-15, -0.32843786176703493), z_dir=(0.32843786176703493, -9.129225613729643e-15, -0.9445255798324883)).offset(-BOSS_EXTRUDE30_DEPTH_BACK)):
        with Locations((-299.279194071, -19.5)):
            Rectangle(SKETCH68_W, SKETCH68_H)
    extrude(amount=BOSS_EXTRUDE30_DEPTH + BOSS_EXTRUDE30_DEPTH_BACK)

    # Sketch69 → Boss-Extrude31 (add)
    with BuildSketch(Plane(origin=(-283.207370923, 0, 814.451186581), x_dir=(-0.9445255798324895, 0, -0.32843786176703144), z_dir=(0.32843786176703144, 0, -0.9445255798324895))):
        with Locations((-324.403636468, -19.5)):
            Rectangle(SKETCH69_W, SKETCH69_H)
    extrude(amount=BOSS_EXTRUDE31_DEPTH)

    # Sketch70 → Boss-Extrude32 (add)
    with BuildSketch(Plane(origin=(308.258672657, 0, 107.190129606), x_dir=(0.3284378617670337, 0, -0.9445255798324887), z_dir=(0.9445255798324887, 0, 0.3284378617670337))):
        with Locations((-863.177220903, -19.5)):
            Rectangle(SKETCH70_W, SKETCH70_H)
    extrude(amount=BOSS_EXTRUDE32_DEPTH)

    # Sketch71 → Boss-Extrude33 (add)
    with BuildSketch(Plane.XZ.offset(21)):
        Polygon((28.589002033, 920.906174309), (26.792870072, 926.071512351), (24.05374589, 925.119042552), (25.841248137, 919.978521948), align=None)
    extrude(amount=BOSS_EXTRUDE33_DEPTH)

    # Sketch72 → Boss-Extrude34 (add)
    with BuildSketch(Plane(origin=(-282.606329636, 0, 812.722704769), x_dir=(-0.9445255798324861, 0, -0.3284378617670412), z_dir=(0.3284378617670412, 0, -0.9445255798324861))):
        with Locations((-328.0134985, -38.71328926)):
            Rectangle(SKETCH72_W, SKETCH72_H)
    extrude(amount=BOSS_EXTRUDE34_DEPTH)

    # Sketch73 → Boss-Extrude35 (add)
    with BuildSketch(Plane(origin=(308.447577773, 0, 107.255817179), x_dir=(-0.32843786176702733, 0, 0.9445255798324909), z_dir=(-0.944525579832491, 0, -0.32843786176702733))):
        with Locations((856.429727564, -38.71328926)):
            Rectangle(SKETCH73_W, SKETCH73_H)
    extrude(amount=BOSS_EXTRUDE35_DEPTH)

    # Sketch74 → Cut-Extrude27 (cut)
    with BuildSketch(Plane.XZ.offset(40.18)):
        with Locations(Location((18.430180878, 912.294788657, 0), (0, 0, 270))):
            Circle(SKETCH74_R)
        with Locations(Location((8.654341123, 908.895456798, 0), (0, 0, 270))):
            Circle(SKETCH74_R)
    extrude(amount=-CUT_EXTRUDE27_DEPTH, mode=Mode.SUBTRACT)


with BuildPart() as body_2_3:
    # Mirror3: mirrored copy
    add(body_2_2.part.mirror(Plane(origin=(-34.71389823, -43.25, 960.314964032), x_dir=(0, 0, 1), z_dir=(0, -1, 0))))


with BuildPart() as body_2_4:
    # Mirror4: mirrored copy
    add(body_2_3.part.mirror(Plane(origin=(-34.71389823, -43.25, 960.314964032), x_dir=(0, 0, 1), z_dir=(0, 1, 0))))

    # Sketch75 → Cut-Extrude28 (cut)
    with BuildSketch(Plane(origin=(278.112718549, 0, 96.707541395), x_dir=(-0.32843786176743106, 0, 0.9445255798323505), z_dir=(-0.9445255798323505, 0, -0.32843786176743106))):
        with Locations((868.450251665, -23.999675203)):
            Circle(SKETCH75_R)
    extrude(amount=-CUT_EXTRUDE28_DEPTH, mode=Mode.SUBTRACT)

    # Sketch76 → Cut-Extrude29 (cut)
    with BuildSketch(Plane(origin=(310.90334428, 0, 108.109755619), x_dir=(0.32843786176703343, 0, -0.9445255798324887), z_dir=(0.9445255798324889, 0, 0.3284378617670335))):
        with Locations(Location((-868.450251635, -23.999675203, 0), (0, 0, 180))):
            Circle(SKETCH76_R)
    extrude(amount=-CUT_EXTRUDE29_DEPTH, mode=Mode.SUBTRACT)

    # Sketch77 → Boss-Extrude37 (add)
    with BuildSketch(Plane(origin=(0, -18, 0), x_dir=(1, 0, 0), z_dir=(0, 1, 0))):
        with BuildLine():
            Line((1.462533805, -921.55041641), (-0.557648707, -919.406501824))
            Line((-0.557648707, -919.406501824), (-2.281492719, -924.363953307))
            Line((-2.281492719, -924.363953307), (-6.699400727, -937.069026653))
            Line((-6.699400727, -937.069026653), (11.67040627, -948.187810964))
            Line((11.67040627, -948.187810964), (16.81454968, -933.394221056))
            Line((16.81454968, -933.394221056), (19.299071834, -926.249202161))
            Line((19.299071834, -926.249202161), (16.634671795, -928.100585311))
            ThreePointArc((16.634671795, -928.100585311), (4.06740687, -936.363431126), (1.462533805, -921.55041641))
        make_face()
    extrude(amount=-BOSS_EXTRUDE37_DEPTH)

    # Sketch78 → Boss-Extrude40 (add)
    with BuildSketch(Plane(origin=(0, -18, 0), x_dir=(1, 0, 0), z_dir=(0, 1, 0))):
        with BuildLine():
            Line((-39.266128585, -978.146354464), (-39.266128585, -988.183184315))
            ThreePointArc((-39.266128585, -988.183184315), (-31.766128585, -980.683184315), (-24.266128585, -988.183184315))
            Line((-24.266128585, -988.183184315), (-24.266128585, -978.146354464))
            Line((-24.266128585, -978.146354464), (-39.266128585, -978.146354464))
        make_face()
    extrude(amount=-BOSS_EXTRUDE40_DEPTH)

    # Sketch79 → Cut-Extrude30 (cut)
    with BuildSketch(Plane(origin=(0, -18, 0), x_dir=(1, 0, 0), z_dir=(0, 1, 0))):
        with Locations((-29.982661302, -973.386354464)):
            Rectangle(SKETCH79_W, SKETCH79_H)
        with Locations((-33.982661302, -973.386354464)):
            Rectangle(SKETCH79_W, SKETCH79_H)
    extrude(amount=-CUT_EXTRUDE30_DEPTH, mode=Mode.SUBTRACT)

    # Sketch85 → Cut-Extrude31 (cut)
    with BuildSketch(Plane(origin=(0, -18, 0), x_dir=(1, 0, 0), z_dir=(0, 1, 0))):
        Polygon((-5.461858654, -962.859459909), (-4.428526542, -960.066178119), (-8.334299408, -958.621296855), (-9.36763152, -961.414578645), align=None)
        Polygon((-0.83135104, -961.396898482), (-4.428526542, -960.066178119), (-5.461858654, -962.859459909), (-1.864683152, -964.190180273), align=None)
    extrude(amount=-CUT_EXTRUDE31_DEPTH, mode=Mode.SUBTRACT)

    # Sketch82 → Cut-Extrude32 (cut)
    with BuildSketch(Plane(origin=(0, -18, 0), x_dir=(1, 0, 0), z_dir=(0, 1, 0))):
        Polygon((5.559542696, -944.376350609), (4.58381617, -947.230053718), (-2.980774937, -944.626793955), (-2.010193078, -941.788137432), align=None)
    extrude(amount=-CUT_EXTRUDE32_DEPTH, mode=Mode.SUBTRACT)


solid = body_2_4.part
